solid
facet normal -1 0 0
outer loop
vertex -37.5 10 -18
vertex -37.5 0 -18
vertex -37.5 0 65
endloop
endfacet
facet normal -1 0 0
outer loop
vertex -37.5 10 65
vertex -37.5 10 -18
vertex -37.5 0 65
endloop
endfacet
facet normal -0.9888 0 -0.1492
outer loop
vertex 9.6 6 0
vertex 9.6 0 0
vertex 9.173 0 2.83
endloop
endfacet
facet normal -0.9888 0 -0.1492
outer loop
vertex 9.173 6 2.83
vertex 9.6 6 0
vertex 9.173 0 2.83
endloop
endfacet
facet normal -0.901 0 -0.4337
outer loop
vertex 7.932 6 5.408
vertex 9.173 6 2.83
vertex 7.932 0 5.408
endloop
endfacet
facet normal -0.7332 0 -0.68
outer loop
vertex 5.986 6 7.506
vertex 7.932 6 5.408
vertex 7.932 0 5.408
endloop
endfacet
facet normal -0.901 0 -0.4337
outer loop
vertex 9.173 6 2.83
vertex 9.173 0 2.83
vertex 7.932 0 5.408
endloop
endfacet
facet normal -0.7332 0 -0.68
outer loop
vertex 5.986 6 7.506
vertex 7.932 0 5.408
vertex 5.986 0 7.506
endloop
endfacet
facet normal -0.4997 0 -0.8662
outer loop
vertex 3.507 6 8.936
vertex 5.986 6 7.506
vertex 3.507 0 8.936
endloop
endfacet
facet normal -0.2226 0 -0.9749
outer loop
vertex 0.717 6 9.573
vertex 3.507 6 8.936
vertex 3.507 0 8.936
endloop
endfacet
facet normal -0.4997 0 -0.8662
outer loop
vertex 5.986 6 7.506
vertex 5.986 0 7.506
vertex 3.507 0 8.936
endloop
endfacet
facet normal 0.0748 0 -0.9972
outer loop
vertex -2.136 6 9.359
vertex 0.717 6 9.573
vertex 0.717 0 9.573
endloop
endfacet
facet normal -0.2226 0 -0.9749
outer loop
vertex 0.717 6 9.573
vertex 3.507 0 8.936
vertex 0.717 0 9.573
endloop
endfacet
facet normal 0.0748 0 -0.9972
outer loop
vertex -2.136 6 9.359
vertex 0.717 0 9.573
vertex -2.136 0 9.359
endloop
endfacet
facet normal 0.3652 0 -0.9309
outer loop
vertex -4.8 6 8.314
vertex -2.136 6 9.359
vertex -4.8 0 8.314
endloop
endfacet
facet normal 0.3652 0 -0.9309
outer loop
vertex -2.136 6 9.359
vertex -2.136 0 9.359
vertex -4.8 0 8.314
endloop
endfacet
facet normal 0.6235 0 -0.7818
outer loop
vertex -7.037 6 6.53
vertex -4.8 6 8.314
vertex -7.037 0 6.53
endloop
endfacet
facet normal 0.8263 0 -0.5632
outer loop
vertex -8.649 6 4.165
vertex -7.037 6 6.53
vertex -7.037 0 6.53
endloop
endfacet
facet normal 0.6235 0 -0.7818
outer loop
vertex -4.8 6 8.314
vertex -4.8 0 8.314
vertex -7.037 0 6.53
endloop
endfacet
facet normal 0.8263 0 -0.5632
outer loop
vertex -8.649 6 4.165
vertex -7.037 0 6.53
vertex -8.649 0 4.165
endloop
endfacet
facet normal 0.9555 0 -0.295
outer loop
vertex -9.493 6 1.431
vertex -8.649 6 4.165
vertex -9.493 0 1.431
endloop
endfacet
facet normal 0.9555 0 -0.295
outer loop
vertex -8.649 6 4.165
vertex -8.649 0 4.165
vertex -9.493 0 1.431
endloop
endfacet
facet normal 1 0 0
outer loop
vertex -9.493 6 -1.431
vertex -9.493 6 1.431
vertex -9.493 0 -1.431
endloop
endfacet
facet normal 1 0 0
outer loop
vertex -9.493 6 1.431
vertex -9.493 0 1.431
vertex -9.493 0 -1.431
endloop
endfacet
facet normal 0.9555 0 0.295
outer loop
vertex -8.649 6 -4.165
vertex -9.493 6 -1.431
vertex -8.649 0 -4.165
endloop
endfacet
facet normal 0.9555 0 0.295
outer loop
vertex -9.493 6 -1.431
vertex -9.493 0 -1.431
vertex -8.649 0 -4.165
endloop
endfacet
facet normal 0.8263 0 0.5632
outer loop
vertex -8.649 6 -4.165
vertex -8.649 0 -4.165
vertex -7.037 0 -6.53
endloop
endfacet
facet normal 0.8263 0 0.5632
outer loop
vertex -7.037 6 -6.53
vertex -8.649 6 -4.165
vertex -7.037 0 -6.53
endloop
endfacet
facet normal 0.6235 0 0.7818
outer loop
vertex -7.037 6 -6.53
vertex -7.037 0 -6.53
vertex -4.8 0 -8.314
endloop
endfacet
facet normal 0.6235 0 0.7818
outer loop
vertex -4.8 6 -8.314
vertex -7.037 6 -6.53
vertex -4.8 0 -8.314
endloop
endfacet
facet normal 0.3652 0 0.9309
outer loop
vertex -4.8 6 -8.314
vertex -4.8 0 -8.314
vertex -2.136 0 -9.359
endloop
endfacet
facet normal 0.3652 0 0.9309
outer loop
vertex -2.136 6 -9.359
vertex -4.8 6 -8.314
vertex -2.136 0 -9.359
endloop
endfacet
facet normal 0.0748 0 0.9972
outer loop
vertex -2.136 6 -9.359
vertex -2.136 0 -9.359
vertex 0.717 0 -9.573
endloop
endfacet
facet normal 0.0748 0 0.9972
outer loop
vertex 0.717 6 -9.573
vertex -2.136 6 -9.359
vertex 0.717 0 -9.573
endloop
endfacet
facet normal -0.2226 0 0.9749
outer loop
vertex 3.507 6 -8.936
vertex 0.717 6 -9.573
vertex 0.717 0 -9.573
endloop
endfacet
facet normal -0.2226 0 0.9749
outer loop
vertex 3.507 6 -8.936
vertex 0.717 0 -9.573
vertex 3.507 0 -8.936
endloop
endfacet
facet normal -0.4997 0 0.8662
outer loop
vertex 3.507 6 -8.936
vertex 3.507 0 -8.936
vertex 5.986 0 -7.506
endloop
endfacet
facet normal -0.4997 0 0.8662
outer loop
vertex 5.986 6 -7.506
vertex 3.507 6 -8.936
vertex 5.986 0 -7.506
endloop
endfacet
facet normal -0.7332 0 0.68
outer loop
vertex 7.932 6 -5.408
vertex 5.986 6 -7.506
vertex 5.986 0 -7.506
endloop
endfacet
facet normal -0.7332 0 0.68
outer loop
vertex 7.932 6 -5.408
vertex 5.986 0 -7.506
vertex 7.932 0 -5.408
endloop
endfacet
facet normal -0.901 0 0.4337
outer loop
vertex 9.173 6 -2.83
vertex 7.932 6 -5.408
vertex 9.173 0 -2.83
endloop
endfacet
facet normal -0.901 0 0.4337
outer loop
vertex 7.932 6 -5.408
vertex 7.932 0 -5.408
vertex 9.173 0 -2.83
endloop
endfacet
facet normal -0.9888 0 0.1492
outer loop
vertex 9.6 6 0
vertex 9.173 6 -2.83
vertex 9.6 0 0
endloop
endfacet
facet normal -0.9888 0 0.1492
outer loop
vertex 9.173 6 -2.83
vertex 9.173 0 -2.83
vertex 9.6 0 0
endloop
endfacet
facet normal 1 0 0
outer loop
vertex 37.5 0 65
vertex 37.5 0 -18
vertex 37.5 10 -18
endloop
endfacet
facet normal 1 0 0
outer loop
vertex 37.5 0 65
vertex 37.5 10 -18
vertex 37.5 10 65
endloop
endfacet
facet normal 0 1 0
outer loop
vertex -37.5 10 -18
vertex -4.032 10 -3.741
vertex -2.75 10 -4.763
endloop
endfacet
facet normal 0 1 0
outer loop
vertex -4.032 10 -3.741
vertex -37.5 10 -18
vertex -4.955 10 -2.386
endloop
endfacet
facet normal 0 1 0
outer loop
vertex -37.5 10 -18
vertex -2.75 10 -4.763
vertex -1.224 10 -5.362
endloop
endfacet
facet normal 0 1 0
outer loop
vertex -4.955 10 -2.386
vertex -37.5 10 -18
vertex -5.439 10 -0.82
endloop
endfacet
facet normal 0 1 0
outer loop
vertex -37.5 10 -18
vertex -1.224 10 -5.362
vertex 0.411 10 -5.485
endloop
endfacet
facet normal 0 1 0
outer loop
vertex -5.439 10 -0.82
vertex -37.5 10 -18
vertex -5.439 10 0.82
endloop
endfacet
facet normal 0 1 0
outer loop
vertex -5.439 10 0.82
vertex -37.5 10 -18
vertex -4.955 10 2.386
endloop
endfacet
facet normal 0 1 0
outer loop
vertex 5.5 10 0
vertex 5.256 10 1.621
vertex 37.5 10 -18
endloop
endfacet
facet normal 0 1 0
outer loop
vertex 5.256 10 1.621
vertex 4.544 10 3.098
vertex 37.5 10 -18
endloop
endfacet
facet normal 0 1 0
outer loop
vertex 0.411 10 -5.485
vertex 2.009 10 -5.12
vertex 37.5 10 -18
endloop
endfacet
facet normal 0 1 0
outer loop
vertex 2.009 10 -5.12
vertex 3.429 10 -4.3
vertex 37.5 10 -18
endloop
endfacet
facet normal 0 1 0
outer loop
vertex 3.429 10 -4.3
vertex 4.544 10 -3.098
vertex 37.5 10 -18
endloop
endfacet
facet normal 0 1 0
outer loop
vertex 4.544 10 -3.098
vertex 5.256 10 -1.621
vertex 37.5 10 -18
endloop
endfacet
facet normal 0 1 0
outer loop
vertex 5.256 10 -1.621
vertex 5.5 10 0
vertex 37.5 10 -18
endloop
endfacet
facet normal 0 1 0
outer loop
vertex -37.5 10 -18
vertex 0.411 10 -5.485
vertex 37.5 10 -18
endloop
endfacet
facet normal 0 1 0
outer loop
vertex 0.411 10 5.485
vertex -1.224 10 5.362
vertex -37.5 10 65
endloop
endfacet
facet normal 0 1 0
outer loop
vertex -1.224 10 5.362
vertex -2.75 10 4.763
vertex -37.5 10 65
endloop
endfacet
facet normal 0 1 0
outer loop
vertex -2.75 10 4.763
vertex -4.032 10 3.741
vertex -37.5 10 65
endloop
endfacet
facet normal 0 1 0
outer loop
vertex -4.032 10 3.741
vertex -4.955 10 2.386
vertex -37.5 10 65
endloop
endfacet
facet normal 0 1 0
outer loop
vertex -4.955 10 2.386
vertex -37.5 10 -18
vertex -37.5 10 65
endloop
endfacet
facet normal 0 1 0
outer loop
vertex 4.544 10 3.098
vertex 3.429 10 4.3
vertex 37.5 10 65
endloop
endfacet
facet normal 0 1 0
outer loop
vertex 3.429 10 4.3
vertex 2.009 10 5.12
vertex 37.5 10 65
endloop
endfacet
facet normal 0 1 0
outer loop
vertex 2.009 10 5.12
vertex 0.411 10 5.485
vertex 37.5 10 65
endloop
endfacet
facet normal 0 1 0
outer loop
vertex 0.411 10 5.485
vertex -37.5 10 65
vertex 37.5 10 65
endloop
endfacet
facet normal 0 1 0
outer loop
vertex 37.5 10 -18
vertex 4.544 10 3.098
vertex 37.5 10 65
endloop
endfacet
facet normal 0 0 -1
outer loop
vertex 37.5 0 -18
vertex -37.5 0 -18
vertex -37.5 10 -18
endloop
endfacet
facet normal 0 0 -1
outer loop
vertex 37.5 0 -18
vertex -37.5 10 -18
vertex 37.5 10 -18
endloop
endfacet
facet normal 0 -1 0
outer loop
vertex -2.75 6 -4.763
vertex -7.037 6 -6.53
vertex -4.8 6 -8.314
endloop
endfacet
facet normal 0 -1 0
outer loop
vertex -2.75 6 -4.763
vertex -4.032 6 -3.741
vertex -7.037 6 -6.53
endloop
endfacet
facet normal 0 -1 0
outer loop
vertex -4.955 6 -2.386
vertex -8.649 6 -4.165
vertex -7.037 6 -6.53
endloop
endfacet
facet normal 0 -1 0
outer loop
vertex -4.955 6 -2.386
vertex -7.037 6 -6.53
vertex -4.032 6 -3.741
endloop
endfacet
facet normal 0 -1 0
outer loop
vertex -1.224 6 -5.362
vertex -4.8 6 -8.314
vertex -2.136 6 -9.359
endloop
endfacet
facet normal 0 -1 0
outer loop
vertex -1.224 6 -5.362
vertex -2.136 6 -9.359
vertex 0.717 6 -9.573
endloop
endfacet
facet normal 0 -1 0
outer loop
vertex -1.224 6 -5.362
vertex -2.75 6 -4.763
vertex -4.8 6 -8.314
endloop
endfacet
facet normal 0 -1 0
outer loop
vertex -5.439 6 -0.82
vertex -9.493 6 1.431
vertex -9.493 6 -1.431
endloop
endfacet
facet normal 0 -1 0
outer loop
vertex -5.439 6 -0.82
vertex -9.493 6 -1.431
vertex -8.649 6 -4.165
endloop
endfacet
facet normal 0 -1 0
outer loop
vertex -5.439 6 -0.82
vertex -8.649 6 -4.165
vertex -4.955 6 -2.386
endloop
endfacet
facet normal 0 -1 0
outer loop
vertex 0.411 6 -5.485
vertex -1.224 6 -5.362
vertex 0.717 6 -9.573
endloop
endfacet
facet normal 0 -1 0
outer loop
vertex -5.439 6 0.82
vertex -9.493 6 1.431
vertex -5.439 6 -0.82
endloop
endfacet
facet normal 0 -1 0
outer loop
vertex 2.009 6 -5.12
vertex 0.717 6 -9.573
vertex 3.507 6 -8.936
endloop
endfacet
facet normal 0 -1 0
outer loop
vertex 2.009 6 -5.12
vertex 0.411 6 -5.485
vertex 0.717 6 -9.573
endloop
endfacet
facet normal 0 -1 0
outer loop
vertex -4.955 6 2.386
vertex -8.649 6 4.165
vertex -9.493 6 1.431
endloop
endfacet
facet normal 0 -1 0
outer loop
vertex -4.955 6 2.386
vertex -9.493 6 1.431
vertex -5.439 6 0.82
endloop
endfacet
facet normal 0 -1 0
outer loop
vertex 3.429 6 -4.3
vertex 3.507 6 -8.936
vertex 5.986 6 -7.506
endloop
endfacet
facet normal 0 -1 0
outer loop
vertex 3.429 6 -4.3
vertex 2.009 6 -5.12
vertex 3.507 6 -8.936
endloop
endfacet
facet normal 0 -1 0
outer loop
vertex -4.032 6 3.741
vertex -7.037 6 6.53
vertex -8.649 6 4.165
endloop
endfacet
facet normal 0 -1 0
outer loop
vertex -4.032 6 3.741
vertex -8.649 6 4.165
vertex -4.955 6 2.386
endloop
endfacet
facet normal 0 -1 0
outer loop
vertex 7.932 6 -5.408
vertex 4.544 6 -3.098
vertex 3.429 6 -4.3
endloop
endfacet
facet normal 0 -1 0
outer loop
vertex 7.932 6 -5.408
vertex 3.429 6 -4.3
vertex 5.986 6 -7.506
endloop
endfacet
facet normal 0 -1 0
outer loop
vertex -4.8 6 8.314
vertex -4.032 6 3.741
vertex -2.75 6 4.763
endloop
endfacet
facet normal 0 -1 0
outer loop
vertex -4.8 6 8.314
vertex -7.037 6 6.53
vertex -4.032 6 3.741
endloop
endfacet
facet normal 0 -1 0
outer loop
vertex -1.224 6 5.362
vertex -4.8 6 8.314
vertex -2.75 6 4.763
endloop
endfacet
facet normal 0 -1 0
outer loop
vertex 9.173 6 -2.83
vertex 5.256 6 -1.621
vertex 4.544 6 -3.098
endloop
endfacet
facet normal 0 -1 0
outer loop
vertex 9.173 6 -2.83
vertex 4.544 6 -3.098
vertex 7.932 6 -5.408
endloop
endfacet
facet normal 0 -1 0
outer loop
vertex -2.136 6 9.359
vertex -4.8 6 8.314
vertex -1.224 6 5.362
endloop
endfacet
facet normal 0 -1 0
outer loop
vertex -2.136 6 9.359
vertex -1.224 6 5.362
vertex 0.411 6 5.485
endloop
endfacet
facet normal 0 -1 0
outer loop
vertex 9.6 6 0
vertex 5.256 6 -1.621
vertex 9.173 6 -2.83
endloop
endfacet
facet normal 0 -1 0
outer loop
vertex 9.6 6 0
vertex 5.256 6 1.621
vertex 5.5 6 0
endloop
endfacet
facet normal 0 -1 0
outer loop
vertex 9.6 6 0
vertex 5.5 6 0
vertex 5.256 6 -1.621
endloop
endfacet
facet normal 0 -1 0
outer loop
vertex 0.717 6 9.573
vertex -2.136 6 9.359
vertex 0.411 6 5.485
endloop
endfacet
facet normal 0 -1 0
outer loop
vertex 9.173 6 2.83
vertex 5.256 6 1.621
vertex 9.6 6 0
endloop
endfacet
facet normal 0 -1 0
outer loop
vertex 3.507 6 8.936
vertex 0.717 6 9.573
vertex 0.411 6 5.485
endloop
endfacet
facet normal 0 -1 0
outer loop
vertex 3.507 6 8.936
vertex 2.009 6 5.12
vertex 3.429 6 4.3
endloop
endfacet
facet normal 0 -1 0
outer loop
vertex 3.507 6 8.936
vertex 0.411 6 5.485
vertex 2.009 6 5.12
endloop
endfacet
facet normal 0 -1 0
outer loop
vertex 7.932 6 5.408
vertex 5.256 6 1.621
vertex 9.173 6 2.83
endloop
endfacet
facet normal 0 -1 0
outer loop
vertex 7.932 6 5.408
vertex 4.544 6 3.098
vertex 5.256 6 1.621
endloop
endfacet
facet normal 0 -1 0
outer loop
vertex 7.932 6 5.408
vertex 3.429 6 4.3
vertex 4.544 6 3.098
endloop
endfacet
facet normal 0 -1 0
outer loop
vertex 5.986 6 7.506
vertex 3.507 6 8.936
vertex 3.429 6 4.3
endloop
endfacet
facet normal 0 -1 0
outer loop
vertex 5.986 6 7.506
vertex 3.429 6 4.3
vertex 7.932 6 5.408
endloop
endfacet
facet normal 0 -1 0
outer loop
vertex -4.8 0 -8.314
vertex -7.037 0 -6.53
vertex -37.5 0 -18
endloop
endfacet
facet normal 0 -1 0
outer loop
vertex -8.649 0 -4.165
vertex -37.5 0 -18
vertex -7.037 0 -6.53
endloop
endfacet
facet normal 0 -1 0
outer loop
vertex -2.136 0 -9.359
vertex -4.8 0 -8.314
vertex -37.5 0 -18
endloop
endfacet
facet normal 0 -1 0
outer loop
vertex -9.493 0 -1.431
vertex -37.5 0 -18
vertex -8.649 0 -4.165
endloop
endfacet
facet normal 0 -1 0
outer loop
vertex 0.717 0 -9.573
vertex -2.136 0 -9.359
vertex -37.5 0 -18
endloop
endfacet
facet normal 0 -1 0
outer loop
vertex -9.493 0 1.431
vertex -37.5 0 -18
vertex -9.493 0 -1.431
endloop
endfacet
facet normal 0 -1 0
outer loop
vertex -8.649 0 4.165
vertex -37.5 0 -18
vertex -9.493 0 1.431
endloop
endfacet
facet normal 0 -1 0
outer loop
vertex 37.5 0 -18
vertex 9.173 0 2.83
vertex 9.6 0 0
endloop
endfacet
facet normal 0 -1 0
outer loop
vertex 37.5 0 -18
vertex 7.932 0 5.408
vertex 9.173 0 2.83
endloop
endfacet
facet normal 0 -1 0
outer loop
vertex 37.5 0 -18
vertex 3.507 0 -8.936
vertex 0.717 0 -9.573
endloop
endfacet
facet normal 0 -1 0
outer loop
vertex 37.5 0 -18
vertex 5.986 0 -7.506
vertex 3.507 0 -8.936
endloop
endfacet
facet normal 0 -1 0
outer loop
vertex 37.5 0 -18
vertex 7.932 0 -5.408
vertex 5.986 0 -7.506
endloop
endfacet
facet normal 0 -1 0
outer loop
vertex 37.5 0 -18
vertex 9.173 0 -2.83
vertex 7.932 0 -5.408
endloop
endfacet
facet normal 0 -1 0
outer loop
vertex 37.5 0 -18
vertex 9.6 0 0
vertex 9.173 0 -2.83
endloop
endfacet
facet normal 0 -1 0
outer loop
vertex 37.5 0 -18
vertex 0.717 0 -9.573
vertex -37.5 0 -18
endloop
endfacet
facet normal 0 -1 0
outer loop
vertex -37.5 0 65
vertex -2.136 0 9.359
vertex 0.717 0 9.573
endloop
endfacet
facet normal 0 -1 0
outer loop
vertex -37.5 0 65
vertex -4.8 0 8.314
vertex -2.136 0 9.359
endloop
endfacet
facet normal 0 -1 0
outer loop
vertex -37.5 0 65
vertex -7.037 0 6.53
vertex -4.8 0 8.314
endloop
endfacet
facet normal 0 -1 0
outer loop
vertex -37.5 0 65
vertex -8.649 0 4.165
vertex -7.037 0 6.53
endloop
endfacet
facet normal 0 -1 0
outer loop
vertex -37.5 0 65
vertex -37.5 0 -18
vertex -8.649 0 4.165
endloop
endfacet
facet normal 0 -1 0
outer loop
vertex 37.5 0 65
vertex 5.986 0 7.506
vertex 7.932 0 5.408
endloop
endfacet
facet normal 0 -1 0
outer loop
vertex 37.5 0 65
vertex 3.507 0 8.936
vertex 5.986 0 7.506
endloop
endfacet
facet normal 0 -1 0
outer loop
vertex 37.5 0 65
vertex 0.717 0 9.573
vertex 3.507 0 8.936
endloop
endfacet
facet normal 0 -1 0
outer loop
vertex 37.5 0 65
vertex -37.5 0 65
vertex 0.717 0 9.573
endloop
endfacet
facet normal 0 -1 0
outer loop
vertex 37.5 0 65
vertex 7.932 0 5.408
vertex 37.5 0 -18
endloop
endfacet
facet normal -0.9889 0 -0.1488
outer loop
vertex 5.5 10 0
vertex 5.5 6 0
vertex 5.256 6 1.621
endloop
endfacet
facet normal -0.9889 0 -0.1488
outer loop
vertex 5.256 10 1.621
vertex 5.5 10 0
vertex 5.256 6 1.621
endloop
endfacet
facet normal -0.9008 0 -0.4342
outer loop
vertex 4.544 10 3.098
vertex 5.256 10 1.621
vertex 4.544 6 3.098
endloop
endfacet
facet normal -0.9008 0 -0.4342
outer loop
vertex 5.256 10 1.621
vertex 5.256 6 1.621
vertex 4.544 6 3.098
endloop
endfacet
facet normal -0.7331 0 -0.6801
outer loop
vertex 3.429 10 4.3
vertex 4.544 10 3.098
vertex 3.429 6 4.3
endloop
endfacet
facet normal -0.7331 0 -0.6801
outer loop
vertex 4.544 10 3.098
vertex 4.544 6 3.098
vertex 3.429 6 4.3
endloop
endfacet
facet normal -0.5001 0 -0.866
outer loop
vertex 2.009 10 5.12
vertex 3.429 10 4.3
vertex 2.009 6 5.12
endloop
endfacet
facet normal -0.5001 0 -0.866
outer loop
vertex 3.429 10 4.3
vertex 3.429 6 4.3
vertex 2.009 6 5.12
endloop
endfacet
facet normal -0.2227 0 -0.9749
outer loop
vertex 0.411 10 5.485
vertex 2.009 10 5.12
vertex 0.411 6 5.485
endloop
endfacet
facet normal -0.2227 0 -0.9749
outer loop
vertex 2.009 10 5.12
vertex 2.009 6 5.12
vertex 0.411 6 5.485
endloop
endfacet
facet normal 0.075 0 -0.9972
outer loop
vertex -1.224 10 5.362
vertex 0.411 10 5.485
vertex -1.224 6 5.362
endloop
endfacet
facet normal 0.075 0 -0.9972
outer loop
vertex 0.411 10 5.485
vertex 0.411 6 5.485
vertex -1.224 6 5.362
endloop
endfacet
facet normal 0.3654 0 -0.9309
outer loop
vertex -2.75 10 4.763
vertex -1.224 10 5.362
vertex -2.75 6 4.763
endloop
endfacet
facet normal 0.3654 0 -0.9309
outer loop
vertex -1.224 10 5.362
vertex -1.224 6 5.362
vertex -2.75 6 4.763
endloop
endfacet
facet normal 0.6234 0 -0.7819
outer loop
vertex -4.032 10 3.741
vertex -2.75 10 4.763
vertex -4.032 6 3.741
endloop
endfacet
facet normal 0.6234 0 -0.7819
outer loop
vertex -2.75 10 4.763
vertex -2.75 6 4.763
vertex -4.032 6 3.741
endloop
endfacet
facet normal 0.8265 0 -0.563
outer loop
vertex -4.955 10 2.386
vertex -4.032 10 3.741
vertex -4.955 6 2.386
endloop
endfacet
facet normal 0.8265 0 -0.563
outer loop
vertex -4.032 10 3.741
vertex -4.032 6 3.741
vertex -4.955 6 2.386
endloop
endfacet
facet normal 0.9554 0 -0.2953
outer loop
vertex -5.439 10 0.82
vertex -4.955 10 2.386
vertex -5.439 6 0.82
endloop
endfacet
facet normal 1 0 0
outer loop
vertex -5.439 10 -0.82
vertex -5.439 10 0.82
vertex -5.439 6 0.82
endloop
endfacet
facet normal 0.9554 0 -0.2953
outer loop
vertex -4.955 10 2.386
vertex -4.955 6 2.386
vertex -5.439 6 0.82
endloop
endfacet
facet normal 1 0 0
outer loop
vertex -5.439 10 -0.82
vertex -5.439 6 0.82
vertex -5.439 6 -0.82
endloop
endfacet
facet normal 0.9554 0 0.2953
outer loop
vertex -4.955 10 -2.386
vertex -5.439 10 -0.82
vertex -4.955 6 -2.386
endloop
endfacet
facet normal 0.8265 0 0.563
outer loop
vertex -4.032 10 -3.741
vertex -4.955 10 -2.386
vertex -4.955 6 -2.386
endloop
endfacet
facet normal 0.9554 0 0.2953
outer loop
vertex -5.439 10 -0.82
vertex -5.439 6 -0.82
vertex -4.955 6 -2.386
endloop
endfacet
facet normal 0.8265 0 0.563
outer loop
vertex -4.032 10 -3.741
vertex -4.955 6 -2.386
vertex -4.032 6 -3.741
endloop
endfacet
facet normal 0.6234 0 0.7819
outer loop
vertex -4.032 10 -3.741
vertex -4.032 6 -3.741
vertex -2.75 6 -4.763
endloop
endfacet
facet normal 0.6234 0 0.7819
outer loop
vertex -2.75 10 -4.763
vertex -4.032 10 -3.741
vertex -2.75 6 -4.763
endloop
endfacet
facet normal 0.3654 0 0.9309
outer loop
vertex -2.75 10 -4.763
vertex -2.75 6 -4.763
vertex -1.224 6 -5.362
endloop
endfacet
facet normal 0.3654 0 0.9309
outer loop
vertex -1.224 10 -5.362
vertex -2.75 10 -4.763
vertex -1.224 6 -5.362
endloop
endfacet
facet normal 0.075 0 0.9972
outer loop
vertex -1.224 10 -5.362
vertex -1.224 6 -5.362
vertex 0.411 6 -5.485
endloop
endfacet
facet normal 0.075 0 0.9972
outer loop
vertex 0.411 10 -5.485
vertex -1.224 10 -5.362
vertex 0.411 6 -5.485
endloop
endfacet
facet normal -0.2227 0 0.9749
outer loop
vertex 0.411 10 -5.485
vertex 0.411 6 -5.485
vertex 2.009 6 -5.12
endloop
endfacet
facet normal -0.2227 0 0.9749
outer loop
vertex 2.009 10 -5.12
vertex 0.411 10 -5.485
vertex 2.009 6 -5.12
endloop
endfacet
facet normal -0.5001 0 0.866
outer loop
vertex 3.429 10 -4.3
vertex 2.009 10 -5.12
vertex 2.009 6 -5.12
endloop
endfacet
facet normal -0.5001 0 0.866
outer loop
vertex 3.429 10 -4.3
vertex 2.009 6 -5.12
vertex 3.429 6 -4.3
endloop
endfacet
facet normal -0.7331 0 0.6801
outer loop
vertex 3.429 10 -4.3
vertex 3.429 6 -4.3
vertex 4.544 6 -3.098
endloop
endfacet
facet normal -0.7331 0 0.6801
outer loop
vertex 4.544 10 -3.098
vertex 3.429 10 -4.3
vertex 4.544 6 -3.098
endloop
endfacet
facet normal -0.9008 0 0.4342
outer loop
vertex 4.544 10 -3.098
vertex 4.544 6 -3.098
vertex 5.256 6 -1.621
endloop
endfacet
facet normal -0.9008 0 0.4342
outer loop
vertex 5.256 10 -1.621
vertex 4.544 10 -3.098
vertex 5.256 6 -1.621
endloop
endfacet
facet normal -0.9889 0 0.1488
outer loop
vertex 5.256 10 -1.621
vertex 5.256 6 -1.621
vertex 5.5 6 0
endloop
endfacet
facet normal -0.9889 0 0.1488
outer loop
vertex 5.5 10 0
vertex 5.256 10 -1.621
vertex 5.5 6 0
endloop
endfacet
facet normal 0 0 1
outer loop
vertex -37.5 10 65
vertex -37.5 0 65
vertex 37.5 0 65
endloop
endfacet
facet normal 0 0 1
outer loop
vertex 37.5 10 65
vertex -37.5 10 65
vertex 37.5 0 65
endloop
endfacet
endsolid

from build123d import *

# Parameters (mm, degrees)
SKETCH001_AS_DRAWN_R                 = 9.6
EXTRUDE001_DEPTH                     = 6
EXTRUDE001_ONTO_SKETCH001_ROLL_ANGLE = 90
SKETCH_AS_DRAWN_W                    = 75
SKETCH_AS_DRAWN_H                    = 83
SKETCH_AS_DRAWN_R                    = 5.5
EXTRUDE_DEPTH                        = 10
EXTRUDE_ONTO_SKETCH_ROLL_ANGLE       = 90


with BuildPart() as pocheroulemente:
    # Sketch001 as drawn → Extrude001 (new)
    with BuildSketch(Plane.XY):
        Circle(SKETCH001_AS_DRAWN_R)
    extrude(amount=-EXTRUDE001_DEPTH)


with BuildPart() as pocheroulemente_1:
    # Extrude001 onto Sketch001 roll: moved
    add(pocheroulemente.part.rotate(Axis((0, 0, 0), (1, 0, 0)), EXTRUDE001_ONTO_SKETCH001_ROLL_ANGLE))


with BuildPart() as pocheroulemente_2:
    # Extrude001 onto Sketch001 placement: moved
    add(pocheroulemente_1.part)


with BuildPart() as supportmoteure:
    # Sketch as drawn → Extrude (new)
    with BuildSketch(Plane.XY):
        with Locations((0, 23.5)):
            Rectangle(SKETCH_AS_DRAWN_W, SKETCH_AS_DRAWN_H)
        Circle(SKETCH_AS_DRAWN_R, mode=Mode.SUBTRACT)
    extrude(amount=-EXTRUDE_DEPTH)


with BuildPart() as supportmoteure_1:
    # Extrude onto Sketch roll: moved
    add(supportmoteure.part.rotate(Axis((0, 0, 0), (1, 0, 0)), EXTRUDE_ONTO_SKETCH_ROLL_ANGLE))


with BuildPart() as supportmoteure_2:
    # Extrude onto Sketch placement: moved
    add(supportmoteure_1.part)

    # Cut: cut pocheRoulementE
    add(pocheroulemente_2.part, mode=Mode.SUBTRACT)


solid = supportmoteure_2.part
